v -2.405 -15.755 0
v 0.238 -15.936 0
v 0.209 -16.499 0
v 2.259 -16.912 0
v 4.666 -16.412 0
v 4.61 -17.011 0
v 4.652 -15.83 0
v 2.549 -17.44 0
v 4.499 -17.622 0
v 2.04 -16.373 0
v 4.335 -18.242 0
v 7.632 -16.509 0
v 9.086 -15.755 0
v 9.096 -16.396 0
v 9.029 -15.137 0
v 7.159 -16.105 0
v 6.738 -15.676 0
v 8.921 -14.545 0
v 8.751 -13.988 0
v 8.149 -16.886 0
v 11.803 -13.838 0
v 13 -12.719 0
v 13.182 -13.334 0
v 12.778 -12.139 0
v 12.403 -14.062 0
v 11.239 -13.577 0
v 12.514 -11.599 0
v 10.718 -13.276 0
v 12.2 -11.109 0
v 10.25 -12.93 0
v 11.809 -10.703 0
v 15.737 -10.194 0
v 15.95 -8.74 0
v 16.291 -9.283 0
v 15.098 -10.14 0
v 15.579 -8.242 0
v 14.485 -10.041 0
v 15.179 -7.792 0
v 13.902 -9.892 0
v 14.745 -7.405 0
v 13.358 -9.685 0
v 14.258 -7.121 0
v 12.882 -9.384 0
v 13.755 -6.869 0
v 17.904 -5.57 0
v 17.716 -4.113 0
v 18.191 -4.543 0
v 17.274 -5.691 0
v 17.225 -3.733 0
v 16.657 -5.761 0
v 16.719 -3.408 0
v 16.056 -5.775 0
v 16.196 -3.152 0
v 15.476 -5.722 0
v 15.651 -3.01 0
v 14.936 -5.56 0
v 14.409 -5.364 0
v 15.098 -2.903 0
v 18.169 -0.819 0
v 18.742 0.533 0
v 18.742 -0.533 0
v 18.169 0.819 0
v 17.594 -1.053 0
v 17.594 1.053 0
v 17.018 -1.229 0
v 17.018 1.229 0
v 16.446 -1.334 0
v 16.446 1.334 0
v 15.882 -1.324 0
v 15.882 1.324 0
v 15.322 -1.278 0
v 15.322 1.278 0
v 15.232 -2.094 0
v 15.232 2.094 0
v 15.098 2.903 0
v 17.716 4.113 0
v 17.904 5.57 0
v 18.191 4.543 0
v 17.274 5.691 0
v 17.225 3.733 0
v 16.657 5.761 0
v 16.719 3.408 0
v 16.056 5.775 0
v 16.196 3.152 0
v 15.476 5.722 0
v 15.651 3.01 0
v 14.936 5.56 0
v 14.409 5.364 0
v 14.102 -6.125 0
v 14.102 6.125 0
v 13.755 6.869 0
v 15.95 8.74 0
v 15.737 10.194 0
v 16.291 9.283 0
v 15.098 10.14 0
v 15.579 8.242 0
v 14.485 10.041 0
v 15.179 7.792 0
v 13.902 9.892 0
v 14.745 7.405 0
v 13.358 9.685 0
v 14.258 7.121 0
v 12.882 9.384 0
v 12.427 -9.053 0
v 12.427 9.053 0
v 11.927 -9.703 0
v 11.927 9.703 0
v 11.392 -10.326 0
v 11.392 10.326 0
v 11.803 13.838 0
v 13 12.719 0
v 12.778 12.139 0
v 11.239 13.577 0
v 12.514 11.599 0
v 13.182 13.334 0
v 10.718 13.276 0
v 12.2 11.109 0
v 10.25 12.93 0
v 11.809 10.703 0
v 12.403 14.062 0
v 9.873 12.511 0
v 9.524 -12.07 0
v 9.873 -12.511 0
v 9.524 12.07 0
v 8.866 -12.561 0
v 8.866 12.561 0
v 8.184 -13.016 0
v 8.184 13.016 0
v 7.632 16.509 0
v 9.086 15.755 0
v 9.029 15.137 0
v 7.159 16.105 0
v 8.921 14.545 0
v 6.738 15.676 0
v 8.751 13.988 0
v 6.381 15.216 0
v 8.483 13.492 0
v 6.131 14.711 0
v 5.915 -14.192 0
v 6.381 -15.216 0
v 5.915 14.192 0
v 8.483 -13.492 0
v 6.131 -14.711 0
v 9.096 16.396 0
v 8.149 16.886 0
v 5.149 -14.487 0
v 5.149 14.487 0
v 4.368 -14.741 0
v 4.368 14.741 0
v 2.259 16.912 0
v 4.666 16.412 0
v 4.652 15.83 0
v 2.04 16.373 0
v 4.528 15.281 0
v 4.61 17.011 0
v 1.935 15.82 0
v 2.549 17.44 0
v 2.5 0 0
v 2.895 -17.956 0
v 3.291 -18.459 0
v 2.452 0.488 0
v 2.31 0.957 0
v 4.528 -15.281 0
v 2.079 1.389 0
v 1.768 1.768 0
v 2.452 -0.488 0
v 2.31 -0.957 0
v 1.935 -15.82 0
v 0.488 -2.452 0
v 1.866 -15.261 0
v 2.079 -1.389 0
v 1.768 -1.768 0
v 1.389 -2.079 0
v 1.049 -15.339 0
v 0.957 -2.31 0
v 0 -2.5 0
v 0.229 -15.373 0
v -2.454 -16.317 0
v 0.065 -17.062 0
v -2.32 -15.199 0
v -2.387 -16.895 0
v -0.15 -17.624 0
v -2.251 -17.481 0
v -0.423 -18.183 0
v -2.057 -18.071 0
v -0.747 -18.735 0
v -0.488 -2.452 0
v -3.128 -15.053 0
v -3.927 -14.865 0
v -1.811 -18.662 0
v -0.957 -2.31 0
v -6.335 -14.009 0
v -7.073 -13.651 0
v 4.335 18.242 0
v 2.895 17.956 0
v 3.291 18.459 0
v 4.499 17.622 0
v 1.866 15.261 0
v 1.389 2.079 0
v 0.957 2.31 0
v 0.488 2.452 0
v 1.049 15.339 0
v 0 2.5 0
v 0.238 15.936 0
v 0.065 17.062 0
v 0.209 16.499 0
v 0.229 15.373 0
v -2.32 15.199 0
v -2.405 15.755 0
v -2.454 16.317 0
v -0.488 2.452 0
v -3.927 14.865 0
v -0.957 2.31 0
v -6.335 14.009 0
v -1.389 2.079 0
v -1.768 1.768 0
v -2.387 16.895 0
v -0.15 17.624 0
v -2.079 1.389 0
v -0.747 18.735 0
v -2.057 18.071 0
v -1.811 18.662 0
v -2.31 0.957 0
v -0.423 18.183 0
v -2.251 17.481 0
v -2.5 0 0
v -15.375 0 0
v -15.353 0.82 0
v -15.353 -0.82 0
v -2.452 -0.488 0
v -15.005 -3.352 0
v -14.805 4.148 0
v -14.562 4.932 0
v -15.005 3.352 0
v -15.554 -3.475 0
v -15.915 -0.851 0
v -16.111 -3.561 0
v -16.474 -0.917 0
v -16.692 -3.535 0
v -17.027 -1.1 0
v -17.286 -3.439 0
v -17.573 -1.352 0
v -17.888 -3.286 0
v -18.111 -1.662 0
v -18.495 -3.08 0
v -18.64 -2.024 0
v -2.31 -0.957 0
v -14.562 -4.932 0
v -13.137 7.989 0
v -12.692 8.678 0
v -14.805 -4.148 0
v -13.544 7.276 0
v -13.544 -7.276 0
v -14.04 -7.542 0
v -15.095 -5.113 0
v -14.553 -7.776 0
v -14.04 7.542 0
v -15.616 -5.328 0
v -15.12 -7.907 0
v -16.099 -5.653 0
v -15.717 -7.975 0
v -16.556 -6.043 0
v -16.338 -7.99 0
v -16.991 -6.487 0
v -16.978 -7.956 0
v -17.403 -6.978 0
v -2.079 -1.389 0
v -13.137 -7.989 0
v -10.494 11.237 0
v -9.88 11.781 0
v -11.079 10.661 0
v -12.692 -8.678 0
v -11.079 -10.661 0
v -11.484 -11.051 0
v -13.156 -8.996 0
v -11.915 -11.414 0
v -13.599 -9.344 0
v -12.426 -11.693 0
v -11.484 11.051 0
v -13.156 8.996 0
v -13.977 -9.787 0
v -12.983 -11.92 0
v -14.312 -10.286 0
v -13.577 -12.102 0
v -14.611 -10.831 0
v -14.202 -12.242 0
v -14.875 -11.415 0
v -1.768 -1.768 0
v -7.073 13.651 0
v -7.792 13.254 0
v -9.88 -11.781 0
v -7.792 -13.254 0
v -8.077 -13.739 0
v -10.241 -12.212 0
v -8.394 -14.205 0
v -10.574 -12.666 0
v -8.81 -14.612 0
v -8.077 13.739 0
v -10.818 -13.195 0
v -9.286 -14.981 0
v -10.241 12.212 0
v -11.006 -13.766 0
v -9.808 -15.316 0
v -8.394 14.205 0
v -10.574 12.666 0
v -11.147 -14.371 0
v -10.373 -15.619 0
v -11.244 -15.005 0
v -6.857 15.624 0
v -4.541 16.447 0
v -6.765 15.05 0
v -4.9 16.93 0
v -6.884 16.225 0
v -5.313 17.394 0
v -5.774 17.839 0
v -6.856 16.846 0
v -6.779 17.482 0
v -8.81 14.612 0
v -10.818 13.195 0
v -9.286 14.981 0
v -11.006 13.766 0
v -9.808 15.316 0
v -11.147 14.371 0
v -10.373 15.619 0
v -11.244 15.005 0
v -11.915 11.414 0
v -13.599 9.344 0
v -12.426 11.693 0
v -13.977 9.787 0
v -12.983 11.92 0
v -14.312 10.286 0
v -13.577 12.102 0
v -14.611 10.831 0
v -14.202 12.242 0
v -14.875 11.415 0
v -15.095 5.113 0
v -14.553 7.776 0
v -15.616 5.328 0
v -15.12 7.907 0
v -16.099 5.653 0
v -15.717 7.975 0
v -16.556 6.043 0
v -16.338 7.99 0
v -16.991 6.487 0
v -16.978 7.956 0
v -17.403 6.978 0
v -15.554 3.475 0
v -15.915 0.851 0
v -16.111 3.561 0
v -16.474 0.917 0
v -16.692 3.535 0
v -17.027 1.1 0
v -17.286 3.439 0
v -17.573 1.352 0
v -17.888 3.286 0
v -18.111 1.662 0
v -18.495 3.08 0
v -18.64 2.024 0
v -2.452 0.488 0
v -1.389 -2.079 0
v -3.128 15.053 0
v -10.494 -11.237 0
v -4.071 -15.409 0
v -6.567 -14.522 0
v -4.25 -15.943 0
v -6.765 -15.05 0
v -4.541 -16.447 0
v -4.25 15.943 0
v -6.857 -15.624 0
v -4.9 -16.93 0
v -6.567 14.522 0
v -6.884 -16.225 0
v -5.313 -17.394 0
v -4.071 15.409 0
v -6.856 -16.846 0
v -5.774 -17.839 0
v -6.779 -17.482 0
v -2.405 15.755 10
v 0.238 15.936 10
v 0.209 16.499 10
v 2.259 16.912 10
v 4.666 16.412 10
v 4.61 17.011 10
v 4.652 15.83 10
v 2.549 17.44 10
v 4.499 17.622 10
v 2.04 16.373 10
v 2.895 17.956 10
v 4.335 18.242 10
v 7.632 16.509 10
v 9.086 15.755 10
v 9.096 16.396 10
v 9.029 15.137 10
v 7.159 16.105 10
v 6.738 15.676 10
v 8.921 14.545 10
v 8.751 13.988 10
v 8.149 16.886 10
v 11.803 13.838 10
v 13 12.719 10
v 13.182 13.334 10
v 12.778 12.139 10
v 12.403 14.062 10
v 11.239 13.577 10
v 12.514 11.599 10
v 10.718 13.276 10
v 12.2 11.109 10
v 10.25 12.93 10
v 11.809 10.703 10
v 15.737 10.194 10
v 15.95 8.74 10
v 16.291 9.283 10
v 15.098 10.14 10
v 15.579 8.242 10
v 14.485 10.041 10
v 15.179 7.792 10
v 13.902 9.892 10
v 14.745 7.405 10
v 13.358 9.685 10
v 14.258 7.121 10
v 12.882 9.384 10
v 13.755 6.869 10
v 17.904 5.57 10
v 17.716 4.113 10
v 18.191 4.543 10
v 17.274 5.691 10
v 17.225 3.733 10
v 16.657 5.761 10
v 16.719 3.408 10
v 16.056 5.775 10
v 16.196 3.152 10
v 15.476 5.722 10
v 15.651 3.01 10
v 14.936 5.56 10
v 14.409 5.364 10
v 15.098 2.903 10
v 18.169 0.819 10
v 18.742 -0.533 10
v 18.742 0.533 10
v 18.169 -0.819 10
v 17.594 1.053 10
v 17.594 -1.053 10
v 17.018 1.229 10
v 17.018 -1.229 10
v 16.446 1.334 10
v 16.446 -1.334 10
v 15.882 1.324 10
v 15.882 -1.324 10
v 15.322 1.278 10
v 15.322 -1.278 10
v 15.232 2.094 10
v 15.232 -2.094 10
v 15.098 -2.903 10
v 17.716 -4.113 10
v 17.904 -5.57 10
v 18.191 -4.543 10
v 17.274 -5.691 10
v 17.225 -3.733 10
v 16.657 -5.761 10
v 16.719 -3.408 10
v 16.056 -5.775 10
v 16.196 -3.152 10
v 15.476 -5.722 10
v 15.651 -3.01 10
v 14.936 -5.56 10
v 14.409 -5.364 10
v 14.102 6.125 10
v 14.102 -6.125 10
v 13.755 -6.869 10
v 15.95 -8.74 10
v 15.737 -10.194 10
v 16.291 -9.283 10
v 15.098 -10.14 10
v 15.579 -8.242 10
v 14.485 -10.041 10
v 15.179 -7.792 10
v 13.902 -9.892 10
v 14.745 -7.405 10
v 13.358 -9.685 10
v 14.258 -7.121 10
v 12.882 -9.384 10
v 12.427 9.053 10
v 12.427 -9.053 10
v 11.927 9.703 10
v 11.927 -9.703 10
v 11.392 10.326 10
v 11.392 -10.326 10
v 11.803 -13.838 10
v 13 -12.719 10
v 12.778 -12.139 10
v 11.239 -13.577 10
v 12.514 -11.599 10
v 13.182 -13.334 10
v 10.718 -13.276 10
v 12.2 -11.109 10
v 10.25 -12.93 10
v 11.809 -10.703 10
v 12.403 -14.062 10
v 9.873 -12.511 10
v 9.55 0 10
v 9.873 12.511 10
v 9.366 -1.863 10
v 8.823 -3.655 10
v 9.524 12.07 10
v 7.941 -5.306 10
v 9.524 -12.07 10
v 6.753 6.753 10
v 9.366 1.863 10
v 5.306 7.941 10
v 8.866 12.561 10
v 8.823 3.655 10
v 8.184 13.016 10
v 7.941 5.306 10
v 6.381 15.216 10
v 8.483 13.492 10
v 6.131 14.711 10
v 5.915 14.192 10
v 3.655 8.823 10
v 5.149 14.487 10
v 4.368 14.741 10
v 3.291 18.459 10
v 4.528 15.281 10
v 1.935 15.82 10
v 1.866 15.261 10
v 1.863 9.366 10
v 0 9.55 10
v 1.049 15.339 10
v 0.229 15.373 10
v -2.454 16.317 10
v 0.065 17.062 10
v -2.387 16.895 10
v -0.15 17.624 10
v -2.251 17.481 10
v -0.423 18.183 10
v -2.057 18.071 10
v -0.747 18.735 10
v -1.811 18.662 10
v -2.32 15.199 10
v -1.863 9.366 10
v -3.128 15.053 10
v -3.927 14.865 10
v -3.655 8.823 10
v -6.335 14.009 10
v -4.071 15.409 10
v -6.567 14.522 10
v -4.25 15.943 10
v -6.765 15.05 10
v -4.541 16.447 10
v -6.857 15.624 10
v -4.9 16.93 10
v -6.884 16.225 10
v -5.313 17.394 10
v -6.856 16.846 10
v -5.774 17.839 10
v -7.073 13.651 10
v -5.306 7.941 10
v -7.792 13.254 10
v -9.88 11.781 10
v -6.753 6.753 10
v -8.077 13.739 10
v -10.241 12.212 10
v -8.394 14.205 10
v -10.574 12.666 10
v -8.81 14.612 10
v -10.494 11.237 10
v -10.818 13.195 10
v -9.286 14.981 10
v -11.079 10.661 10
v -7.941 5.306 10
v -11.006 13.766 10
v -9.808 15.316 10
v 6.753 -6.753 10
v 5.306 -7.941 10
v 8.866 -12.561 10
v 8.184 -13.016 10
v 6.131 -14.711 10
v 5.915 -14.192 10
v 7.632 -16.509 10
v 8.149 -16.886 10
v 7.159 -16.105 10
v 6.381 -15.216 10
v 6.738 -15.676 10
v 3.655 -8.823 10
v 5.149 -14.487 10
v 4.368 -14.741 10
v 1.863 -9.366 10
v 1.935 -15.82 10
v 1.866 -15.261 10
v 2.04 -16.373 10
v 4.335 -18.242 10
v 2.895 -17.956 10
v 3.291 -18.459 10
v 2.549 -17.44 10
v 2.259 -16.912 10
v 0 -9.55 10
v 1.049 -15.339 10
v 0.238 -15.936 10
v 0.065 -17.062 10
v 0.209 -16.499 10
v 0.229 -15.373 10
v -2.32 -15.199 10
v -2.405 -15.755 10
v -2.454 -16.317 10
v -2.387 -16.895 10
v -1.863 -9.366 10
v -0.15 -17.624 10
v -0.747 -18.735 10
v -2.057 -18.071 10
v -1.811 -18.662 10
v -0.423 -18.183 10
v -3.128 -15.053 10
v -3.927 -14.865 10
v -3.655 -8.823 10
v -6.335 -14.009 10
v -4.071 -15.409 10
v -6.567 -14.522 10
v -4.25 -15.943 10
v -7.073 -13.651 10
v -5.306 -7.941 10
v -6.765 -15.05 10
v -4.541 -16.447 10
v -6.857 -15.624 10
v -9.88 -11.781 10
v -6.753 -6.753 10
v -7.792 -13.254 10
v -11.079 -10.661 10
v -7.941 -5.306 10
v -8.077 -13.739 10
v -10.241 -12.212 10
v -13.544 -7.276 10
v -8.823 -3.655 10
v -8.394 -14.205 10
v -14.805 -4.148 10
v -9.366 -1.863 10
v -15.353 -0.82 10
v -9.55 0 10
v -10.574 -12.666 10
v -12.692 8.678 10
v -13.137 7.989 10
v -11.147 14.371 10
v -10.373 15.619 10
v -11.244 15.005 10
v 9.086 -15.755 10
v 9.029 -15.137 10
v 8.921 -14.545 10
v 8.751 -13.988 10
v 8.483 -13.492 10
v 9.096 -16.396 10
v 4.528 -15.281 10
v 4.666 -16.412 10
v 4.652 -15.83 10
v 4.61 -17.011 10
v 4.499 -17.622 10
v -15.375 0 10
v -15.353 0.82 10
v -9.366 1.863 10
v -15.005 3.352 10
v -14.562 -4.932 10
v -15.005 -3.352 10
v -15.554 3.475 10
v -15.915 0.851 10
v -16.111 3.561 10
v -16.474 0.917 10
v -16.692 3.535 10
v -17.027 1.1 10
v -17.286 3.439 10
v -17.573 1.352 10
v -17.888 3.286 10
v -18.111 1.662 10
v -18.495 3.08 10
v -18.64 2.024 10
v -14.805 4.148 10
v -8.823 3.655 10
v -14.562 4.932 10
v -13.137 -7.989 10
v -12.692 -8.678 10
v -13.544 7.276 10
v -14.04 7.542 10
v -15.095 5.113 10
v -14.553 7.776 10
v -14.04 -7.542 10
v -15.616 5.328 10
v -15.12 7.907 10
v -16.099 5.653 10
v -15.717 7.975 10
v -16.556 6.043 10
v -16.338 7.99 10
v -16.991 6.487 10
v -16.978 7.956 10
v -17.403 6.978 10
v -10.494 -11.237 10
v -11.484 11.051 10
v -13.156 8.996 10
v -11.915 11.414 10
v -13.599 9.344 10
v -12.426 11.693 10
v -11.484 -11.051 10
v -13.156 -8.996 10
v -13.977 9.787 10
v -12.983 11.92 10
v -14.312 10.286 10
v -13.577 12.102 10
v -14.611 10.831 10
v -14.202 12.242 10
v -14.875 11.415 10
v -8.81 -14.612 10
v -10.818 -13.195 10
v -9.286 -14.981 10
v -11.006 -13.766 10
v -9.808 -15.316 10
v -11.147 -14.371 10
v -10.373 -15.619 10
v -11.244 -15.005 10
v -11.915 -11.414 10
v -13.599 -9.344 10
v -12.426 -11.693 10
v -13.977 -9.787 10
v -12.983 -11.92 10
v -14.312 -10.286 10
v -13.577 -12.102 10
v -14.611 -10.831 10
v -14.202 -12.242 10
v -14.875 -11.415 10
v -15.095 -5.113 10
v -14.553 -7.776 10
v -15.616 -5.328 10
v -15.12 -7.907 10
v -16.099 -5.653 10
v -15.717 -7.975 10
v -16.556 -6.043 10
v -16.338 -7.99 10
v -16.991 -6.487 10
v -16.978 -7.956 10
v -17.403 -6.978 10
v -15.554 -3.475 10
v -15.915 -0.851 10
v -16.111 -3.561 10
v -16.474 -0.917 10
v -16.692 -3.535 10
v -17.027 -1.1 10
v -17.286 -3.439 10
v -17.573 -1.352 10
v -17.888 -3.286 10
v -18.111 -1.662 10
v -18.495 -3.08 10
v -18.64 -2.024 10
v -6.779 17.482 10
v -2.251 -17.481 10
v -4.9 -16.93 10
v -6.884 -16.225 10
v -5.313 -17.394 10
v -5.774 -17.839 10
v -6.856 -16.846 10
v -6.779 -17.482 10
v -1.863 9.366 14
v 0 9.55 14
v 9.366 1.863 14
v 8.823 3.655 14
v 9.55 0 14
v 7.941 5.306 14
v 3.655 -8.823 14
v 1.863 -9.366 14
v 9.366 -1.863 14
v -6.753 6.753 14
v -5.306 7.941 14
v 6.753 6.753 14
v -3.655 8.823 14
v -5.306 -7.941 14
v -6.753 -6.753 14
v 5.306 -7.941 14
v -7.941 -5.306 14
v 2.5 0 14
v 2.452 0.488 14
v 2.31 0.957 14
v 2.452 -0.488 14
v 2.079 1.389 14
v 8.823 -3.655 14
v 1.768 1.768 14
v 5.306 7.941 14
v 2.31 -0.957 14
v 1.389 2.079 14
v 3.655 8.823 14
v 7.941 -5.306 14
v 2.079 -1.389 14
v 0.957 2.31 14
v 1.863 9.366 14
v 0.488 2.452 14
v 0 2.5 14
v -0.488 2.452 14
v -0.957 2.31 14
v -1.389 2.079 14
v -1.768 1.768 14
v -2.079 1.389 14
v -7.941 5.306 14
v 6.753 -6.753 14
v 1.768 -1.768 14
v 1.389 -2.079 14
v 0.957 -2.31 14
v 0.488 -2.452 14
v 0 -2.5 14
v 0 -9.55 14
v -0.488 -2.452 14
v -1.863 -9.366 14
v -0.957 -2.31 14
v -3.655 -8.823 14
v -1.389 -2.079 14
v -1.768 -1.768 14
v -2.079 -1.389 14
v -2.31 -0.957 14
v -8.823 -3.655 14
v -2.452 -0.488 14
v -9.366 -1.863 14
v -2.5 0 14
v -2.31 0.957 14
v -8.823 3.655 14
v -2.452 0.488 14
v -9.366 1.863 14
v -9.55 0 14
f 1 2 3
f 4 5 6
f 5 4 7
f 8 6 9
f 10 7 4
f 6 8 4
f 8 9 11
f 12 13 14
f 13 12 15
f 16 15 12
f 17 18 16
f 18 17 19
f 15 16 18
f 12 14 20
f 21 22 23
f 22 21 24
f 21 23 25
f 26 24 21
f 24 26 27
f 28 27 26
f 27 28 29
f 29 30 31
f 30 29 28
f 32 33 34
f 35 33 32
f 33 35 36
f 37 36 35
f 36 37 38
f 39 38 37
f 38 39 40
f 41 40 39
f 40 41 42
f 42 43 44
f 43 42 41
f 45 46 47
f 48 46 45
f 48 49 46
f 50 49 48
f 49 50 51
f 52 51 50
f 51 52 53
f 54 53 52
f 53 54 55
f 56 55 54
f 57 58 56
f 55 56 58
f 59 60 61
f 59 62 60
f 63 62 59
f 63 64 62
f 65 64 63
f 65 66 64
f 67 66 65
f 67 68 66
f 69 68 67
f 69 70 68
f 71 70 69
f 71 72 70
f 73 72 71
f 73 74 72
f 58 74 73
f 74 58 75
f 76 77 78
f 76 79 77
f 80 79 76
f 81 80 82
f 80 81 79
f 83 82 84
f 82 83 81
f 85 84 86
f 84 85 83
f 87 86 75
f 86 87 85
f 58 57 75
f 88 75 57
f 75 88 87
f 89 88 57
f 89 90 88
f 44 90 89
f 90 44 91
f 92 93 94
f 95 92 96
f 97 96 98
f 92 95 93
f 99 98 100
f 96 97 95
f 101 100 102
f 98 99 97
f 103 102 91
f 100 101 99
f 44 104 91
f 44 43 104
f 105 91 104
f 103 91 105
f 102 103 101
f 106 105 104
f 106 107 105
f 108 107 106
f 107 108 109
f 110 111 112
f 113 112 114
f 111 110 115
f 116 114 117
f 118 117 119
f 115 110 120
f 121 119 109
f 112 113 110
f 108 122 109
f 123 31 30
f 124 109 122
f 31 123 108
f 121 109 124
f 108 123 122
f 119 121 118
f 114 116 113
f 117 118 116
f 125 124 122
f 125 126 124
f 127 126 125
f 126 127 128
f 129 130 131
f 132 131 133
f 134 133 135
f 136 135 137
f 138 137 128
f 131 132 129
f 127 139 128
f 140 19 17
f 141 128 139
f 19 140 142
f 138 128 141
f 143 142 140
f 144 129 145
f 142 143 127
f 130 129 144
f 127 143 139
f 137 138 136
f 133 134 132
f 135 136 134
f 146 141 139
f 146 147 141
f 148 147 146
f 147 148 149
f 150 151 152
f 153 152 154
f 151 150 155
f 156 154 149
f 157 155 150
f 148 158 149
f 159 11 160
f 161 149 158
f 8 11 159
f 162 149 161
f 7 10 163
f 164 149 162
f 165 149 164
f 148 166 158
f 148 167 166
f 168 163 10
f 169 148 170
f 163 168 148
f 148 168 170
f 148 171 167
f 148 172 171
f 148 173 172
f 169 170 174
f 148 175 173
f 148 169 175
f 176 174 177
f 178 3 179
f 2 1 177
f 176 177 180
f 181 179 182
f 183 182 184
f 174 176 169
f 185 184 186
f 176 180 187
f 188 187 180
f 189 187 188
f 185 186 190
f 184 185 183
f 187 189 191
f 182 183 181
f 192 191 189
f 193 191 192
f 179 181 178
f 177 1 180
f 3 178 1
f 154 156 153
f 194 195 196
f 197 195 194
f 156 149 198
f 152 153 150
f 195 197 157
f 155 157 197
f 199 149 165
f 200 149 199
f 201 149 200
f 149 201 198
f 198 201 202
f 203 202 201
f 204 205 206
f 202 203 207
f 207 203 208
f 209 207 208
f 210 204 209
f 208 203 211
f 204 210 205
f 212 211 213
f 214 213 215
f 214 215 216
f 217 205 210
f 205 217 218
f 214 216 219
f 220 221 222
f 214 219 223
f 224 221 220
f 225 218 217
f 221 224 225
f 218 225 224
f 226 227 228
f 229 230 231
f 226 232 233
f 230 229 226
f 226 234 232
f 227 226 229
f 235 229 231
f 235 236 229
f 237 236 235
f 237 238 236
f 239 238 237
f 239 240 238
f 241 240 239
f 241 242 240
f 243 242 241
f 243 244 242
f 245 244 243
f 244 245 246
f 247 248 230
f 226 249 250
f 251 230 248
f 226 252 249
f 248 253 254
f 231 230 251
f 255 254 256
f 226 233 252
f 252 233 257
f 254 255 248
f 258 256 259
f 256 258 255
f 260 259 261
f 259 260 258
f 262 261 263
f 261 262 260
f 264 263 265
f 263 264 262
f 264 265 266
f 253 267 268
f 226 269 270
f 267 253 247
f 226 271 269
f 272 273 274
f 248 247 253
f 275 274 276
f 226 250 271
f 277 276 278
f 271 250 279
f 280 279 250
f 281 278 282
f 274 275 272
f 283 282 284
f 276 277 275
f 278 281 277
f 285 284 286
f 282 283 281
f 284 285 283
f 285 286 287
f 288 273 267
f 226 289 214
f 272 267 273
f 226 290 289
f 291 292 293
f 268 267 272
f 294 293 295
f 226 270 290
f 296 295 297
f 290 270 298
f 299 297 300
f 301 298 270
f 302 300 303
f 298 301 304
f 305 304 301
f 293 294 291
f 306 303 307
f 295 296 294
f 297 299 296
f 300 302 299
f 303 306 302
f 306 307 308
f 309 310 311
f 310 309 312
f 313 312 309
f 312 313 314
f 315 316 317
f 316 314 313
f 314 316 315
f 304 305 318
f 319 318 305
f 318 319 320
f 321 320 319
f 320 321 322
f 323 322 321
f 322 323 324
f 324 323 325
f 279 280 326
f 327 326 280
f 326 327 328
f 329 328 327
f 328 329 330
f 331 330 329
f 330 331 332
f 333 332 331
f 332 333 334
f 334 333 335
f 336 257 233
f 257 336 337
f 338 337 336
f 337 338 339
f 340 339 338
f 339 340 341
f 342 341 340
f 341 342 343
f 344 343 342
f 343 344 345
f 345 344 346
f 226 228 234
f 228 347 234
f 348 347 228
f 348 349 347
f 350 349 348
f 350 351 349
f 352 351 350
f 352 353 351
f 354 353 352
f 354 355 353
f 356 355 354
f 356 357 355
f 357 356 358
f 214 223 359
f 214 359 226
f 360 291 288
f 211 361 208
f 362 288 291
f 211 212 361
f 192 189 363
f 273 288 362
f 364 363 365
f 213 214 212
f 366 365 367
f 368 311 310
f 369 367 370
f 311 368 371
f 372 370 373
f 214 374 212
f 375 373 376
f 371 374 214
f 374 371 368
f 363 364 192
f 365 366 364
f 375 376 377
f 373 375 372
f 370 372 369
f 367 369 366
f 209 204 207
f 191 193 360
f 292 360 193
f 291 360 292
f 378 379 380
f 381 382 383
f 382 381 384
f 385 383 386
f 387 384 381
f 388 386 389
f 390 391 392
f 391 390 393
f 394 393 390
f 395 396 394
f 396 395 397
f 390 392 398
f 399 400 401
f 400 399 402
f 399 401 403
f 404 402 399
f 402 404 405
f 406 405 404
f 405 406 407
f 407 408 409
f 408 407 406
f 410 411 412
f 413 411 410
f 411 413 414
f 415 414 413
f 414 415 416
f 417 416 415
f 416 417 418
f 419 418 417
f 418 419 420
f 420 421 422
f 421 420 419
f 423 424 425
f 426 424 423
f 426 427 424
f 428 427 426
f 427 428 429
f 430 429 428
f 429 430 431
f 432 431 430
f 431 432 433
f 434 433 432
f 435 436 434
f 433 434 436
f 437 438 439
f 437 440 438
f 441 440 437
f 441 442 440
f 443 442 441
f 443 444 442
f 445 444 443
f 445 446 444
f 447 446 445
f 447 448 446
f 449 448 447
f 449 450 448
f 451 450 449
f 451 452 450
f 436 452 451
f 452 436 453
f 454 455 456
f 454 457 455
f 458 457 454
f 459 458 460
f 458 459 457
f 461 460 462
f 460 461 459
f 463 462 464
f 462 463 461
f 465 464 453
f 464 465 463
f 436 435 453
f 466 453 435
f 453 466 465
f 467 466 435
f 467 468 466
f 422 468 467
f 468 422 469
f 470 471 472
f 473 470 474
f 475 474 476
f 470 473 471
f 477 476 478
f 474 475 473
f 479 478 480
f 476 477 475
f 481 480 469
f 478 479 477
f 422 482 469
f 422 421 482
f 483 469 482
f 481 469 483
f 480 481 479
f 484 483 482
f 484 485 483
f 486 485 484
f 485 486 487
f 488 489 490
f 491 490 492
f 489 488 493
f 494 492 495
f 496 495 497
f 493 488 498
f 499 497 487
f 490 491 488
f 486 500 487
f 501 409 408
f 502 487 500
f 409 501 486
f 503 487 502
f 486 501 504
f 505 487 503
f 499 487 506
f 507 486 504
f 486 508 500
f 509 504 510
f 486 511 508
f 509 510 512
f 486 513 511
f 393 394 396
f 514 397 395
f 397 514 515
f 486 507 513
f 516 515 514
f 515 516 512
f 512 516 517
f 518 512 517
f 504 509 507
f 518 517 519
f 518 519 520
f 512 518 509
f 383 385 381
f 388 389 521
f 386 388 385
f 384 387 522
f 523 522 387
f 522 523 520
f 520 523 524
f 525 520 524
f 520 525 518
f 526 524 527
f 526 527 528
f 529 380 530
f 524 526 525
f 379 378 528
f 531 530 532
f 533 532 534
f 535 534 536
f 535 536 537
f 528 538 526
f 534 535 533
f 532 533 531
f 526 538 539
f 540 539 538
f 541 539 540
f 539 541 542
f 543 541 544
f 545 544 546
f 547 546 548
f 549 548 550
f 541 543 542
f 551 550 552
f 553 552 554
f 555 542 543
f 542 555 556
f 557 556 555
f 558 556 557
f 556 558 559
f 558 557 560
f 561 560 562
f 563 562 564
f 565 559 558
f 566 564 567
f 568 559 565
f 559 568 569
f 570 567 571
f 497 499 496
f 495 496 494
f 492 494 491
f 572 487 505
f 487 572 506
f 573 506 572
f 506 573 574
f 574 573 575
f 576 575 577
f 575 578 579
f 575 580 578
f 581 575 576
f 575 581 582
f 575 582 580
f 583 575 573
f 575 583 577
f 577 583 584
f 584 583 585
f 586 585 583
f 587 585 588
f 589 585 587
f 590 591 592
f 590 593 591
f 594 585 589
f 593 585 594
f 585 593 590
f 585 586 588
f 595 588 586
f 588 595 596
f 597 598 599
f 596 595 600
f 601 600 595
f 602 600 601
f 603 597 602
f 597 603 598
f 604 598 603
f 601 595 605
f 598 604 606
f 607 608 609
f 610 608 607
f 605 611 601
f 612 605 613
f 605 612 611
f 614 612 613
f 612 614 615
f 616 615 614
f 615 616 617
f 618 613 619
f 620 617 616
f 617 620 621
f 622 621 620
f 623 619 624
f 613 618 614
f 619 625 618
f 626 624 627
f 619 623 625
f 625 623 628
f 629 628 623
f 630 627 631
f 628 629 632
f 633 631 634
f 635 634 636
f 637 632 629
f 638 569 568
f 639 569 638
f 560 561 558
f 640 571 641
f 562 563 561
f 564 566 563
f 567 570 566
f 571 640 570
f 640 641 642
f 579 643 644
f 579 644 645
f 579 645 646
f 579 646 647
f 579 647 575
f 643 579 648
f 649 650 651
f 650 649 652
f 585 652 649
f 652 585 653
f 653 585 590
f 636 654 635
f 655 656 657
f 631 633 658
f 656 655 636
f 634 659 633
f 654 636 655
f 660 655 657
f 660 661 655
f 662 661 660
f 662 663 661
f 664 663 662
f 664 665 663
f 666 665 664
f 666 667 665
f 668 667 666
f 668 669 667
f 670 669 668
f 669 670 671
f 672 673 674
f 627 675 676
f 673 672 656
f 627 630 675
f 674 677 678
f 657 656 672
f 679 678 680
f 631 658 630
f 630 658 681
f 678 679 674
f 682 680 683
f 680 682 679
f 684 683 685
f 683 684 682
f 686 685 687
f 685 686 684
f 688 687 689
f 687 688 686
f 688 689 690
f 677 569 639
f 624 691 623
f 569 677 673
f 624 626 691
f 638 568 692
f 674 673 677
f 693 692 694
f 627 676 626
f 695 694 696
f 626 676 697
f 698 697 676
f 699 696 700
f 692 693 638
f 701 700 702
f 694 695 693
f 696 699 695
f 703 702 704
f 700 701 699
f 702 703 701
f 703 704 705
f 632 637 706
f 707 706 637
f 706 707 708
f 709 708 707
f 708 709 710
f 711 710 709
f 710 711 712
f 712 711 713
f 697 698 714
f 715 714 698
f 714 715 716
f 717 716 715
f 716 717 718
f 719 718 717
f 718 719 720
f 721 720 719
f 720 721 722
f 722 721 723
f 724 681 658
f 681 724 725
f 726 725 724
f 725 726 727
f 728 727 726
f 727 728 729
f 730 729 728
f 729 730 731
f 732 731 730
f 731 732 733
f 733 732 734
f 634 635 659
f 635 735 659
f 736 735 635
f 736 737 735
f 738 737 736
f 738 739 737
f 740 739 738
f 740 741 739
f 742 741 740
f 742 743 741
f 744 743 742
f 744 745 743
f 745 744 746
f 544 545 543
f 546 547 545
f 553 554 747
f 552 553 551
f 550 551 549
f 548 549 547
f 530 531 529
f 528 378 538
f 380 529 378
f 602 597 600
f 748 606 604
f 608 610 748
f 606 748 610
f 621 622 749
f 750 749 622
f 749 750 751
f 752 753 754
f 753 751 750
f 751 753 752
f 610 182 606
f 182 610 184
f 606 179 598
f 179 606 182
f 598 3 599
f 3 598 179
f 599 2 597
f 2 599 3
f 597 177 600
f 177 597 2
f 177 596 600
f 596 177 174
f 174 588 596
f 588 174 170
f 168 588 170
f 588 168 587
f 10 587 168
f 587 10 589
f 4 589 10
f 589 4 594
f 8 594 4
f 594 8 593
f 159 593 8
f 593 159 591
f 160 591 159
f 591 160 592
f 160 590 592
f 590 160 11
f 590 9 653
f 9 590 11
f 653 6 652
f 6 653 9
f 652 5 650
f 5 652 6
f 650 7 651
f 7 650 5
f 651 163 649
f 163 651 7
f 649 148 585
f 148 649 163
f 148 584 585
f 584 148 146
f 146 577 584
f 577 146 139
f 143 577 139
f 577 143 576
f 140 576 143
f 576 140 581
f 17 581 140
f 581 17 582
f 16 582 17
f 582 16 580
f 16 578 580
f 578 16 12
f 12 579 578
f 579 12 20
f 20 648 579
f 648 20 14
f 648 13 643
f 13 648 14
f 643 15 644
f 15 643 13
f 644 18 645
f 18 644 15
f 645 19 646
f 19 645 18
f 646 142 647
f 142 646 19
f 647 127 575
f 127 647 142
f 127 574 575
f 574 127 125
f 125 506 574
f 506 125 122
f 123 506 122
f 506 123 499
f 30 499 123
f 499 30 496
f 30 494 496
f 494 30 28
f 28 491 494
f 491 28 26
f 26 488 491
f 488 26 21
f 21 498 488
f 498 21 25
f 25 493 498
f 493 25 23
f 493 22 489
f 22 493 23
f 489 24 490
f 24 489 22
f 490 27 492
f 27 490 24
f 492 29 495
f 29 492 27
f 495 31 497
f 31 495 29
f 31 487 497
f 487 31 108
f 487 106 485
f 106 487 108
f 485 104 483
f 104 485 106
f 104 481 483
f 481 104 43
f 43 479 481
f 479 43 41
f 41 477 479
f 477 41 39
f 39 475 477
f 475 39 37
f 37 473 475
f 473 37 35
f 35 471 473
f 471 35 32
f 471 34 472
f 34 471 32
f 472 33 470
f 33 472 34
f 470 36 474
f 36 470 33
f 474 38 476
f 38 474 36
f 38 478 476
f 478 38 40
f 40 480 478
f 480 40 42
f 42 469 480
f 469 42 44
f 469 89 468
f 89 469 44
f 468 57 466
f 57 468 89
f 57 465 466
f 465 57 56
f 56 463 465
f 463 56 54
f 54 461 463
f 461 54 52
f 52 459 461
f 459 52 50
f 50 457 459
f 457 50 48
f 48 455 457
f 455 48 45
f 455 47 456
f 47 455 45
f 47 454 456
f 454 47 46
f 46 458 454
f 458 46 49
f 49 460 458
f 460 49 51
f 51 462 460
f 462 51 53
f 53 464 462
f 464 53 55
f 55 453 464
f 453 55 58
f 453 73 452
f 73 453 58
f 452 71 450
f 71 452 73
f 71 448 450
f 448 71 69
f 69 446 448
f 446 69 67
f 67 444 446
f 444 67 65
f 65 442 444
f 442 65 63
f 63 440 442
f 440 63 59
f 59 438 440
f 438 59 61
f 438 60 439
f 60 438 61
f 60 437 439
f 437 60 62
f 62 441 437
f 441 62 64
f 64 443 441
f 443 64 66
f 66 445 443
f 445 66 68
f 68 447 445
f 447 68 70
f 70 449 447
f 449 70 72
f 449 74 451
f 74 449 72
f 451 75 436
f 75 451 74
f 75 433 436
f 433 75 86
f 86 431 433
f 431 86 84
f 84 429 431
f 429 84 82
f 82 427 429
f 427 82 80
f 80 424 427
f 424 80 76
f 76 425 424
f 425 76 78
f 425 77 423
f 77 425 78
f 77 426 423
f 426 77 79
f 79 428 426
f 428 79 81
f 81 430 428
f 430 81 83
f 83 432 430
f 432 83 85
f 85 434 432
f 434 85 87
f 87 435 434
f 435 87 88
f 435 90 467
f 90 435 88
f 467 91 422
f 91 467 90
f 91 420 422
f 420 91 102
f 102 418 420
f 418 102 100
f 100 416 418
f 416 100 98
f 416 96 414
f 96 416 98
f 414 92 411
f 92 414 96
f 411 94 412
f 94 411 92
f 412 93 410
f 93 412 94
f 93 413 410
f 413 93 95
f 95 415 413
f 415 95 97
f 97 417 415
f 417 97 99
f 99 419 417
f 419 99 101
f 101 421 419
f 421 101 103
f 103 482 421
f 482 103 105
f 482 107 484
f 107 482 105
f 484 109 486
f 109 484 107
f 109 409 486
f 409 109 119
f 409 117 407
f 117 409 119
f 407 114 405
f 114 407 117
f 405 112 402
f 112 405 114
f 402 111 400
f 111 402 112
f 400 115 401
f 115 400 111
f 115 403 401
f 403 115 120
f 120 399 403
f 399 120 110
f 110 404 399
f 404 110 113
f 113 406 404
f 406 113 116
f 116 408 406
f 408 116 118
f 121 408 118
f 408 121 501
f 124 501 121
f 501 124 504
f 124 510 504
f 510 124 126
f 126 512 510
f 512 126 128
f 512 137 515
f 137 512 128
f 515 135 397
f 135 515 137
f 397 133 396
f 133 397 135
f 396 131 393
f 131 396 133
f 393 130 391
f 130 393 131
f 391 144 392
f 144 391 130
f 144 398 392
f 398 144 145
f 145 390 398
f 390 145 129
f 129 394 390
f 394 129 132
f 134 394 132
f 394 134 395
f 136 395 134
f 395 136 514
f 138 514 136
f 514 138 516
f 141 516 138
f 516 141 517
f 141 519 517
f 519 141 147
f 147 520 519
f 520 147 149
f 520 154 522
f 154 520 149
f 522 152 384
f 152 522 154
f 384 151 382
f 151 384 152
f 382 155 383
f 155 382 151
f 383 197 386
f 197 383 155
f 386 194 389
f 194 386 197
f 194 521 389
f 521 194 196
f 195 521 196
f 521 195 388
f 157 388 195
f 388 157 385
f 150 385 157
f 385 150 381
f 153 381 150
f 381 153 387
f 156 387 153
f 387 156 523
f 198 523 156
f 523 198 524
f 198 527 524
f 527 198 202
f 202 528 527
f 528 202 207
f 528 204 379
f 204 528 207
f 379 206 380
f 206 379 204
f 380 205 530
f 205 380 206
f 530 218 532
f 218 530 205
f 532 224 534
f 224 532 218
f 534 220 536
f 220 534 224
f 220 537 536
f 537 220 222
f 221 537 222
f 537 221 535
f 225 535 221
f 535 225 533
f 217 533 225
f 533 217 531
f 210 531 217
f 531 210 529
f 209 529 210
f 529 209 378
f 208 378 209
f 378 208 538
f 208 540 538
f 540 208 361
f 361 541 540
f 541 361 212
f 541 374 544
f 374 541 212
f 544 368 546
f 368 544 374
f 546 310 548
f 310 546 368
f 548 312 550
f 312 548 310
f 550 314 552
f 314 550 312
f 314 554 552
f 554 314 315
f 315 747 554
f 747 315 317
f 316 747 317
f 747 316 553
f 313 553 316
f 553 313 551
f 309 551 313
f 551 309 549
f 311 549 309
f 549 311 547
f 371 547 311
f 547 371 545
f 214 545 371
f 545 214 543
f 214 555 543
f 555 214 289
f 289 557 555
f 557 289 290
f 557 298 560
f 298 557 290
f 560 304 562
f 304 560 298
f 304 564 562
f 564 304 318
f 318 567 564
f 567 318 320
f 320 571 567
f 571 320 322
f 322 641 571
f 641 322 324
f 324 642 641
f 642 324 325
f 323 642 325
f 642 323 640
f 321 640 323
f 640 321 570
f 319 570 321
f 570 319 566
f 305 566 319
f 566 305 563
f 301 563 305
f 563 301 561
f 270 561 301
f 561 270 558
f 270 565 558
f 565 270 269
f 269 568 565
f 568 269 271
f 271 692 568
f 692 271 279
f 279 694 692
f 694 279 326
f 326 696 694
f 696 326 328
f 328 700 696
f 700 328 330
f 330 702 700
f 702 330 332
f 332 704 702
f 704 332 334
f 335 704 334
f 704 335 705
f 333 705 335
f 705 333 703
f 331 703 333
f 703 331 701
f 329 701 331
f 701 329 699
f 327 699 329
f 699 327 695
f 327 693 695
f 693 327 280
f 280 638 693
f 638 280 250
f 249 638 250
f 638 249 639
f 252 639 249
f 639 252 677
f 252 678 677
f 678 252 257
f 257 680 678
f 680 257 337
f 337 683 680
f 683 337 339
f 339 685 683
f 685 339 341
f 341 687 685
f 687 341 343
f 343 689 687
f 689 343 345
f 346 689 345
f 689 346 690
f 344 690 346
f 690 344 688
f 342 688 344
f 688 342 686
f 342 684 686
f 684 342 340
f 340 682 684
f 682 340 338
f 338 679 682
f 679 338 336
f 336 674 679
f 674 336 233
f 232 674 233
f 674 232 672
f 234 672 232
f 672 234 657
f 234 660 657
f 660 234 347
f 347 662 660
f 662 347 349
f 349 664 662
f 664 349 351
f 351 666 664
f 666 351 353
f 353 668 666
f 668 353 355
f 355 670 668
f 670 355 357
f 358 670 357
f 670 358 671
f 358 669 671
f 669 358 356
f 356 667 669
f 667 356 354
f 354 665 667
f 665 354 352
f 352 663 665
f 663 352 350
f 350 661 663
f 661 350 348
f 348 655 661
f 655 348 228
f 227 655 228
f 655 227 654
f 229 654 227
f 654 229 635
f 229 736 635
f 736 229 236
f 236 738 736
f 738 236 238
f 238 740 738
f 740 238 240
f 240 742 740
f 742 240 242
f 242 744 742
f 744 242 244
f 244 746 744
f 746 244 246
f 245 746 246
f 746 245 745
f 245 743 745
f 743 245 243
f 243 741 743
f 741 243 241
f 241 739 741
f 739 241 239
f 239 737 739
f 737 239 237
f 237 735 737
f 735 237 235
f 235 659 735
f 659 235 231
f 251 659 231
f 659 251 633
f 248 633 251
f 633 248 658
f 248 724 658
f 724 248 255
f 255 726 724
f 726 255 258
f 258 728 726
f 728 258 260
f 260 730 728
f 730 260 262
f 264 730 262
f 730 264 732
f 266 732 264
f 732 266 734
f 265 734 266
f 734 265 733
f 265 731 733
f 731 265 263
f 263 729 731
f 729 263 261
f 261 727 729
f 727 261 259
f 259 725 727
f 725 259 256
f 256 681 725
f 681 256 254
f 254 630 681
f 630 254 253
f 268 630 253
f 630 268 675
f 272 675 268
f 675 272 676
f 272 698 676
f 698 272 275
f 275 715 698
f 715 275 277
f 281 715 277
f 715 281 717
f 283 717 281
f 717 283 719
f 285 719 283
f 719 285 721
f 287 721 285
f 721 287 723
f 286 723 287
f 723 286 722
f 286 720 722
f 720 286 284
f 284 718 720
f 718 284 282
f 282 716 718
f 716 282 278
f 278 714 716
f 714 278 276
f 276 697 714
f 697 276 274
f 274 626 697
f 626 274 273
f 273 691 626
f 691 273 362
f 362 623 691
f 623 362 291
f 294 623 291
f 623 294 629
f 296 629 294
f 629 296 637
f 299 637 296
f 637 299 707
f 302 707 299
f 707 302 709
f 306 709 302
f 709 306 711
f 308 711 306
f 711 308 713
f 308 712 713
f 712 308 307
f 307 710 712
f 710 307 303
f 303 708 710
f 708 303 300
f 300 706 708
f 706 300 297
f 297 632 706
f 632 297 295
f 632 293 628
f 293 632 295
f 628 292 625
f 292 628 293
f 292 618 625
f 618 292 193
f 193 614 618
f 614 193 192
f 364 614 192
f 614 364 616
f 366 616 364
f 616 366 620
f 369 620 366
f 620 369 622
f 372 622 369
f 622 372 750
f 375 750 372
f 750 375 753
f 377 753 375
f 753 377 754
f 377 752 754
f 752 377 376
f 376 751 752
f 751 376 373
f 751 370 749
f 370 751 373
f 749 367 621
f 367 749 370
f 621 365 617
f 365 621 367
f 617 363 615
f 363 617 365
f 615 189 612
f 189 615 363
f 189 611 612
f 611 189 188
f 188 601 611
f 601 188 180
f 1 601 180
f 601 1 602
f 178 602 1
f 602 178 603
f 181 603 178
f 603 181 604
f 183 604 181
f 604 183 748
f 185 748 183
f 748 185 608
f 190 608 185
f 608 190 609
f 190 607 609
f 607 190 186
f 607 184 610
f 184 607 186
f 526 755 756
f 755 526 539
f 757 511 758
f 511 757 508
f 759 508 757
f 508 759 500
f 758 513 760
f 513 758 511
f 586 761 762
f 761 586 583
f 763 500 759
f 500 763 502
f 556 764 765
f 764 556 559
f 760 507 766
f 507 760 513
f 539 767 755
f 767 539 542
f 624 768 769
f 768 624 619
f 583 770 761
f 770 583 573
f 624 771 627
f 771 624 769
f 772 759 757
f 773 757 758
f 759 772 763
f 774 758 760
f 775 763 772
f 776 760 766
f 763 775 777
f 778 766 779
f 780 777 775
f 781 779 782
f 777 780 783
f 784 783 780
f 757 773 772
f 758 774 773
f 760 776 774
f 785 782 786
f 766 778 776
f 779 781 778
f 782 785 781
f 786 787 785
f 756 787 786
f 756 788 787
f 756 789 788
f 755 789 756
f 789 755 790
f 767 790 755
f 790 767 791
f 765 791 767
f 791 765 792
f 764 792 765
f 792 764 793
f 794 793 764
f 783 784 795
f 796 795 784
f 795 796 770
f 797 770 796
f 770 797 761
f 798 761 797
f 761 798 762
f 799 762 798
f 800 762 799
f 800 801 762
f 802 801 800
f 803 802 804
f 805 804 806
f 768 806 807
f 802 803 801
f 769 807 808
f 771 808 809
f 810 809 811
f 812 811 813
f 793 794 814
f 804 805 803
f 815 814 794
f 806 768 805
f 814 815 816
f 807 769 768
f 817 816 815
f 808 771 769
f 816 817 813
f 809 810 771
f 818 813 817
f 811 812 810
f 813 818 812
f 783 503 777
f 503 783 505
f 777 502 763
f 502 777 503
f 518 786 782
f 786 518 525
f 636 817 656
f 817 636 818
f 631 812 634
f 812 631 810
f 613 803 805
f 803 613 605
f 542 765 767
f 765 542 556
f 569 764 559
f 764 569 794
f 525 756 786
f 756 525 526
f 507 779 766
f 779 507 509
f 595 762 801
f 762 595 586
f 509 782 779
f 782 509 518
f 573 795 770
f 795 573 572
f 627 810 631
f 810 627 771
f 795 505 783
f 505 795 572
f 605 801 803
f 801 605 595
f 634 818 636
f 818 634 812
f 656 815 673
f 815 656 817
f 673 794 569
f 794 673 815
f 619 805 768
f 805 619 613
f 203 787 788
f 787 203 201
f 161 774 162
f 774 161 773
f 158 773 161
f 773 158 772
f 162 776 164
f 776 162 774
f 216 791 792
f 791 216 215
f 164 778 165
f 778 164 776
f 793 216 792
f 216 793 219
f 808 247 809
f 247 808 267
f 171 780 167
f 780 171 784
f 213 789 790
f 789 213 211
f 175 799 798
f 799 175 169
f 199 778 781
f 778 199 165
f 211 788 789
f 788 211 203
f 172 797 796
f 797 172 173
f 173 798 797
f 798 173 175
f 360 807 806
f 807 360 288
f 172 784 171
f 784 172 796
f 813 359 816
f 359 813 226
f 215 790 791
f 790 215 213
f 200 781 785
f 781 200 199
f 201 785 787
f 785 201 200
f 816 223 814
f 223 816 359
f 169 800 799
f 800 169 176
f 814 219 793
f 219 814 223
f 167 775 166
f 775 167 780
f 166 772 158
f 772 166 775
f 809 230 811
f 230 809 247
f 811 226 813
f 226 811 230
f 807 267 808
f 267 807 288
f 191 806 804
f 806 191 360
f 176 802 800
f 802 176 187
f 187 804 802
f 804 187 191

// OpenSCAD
$fn = 32;

// ----------------------------------------------------------------------
// Spur gear: m=1.5 z=23, 37.5 mm tip diameter x 14 mm
// ----------------------------------------------------------------------

// --- parameters (mm) ---
module_m = 1.5;           // module
teeth = 23;               // number of teeth
face_w = 10;              // face width
pa = 20;                  // pressure angle, deg
bore_d = 5;               // shaft bore
hub_d = 19.1;             // hub diameter
hub_h = 4;                // hub above the face

/* --- involute profile --- */
pitch_r = module_m * teeth / 2;
base_r = pitch_r * cos(pa);
tip_r = pitch_r + module_m;
root_r = pitch_r - 1.25 * module_m;
flank_steps = 6;

function inv_deg(a) = (tan(a) - a * PI / 180) * 180 / PI;
function flank_r(i) = root_r + (tip_r - root_r) * i / flank_steps;
function half_angle(r) = 90 / teeth + inv_deg(pa) - inv_deg(acos(min(1, base_r / r)));
function tooth_pt(k, i, side) =
    let (r = flank_r(i), a = k * 360 / teeth + side * half_angle(r))
    [r * cos(a), r * sin(a)];

module tooth_profile() {
  polygon(points = [
    for (k = [0 : teeth - 1])
      each [
        for (i = [0 : flank_steps]) tooth_pt(k, i, -1),
        for (i = [flank_steps : -1 : 0]) tooth_pt(k, i, 1),
        let (ta = (k + 0.5) * 360 / teeth)
          [root_r * cos(ta), root_r * sin(ta)]
      ]
  ]);
}

module gear_disc() {
  linear_extrude(height = face_w) tooth_profile();
}

module hub_boss() {
  translate([0, 0, face_w - 1]) cylinder(h = hub_h + 1, d = hub_d);
}

difference() {
  union() {
    gear_disc();
    hub_boss();
  }
  translate([0, 0, -1]) cylinder(h = face_w + hub_h + 3, d = bore_d);
}
